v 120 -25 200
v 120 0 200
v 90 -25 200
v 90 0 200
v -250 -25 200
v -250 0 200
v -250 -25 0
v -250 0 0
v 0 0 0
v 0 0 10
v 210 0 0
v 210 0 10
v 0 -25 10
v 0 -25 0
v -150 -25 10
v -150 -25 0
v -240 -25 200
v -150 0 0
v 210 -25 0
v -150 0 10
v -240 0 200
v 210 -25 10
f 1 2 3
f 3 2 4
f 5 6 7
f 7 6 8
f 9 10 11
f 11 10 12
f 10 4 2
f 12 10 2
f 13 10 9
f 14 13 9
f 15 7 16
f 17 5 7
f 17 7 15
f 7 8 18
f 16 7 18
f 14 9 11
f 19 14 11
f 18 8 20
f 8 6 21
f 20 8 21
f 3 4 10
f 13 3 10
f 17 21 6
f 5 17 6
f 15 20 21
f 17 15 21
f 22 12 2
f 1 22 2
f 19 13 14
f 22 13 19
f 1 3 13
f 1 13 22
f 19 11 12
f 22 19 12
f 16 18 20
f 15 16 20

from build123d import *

# Parameters (mm, degrees)
F1_DEPTH = 25
F2_DEPTH = 25


with BuildPart() as f1:
    # F0 (on Front) → F1 (new body)
    with BuildSketch(Plane.XZ):
        Polygon((-240, 200), (-250, 200), (-250, 0), (-150, 0), (-150, 10), align=None)
    extrude(amount=F1_DEPTH)


with BuildPart() as f2:
    # F0 (on Front) → F2 (new body)
    with BuildSketch(Plane.XZ):
        Polygon((0, 10), (0, 0), (210, 0), (210, 10), (120, 200), (90, 200), align=None)
    extrude(amount=F2_DEPTH)


solid = Compound([f1.part, f2.part])
